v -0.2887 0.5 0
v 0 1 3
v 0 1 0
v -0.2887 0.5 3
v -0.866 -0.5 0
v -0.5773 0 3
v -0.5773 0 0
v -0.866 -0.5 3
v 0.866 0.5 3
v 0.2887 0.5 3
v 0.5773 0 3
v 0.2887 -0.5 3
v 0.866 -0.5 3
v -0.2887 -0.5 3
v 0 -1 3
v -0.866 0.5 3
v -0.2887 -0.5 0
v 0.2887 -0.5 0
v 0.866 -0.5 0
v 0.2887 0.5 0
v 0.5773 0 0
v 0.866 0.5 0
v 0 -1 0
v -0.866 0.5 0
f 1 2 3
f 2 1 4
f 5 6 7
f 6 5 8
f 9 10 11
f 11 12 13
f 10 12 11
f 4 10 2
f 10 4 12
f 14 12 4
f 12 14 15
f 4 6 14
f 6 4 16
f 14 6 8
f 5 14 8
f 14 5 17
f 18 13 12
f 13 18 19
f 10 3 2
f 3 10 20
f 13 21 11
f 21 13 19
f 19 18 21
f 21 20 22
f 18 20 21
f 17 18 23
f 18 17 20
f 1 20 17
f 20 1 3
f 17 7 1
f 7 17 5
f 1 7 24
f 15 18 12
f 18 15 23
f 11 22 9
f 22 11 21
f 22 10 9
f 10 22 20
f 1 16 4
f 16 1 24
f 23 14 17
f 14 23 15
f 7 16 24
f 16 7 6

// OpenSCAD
// file: ../../../triangle/triangle.scad
module triangle(size, height)
{
    rotate([0, 0, 90])
    cylinder(r=size, 
             $fn=3,
             h=height);
}
// main file
use <../../../triangle/triangle.scad>

starOfDavid();

module starOfDavid()
{
    height = 3;
    
    union()
    {
        triangle(height = height);
        
        rotate([0, 0, 180])
        color("green")
        triangle(height = height);
    }
}
